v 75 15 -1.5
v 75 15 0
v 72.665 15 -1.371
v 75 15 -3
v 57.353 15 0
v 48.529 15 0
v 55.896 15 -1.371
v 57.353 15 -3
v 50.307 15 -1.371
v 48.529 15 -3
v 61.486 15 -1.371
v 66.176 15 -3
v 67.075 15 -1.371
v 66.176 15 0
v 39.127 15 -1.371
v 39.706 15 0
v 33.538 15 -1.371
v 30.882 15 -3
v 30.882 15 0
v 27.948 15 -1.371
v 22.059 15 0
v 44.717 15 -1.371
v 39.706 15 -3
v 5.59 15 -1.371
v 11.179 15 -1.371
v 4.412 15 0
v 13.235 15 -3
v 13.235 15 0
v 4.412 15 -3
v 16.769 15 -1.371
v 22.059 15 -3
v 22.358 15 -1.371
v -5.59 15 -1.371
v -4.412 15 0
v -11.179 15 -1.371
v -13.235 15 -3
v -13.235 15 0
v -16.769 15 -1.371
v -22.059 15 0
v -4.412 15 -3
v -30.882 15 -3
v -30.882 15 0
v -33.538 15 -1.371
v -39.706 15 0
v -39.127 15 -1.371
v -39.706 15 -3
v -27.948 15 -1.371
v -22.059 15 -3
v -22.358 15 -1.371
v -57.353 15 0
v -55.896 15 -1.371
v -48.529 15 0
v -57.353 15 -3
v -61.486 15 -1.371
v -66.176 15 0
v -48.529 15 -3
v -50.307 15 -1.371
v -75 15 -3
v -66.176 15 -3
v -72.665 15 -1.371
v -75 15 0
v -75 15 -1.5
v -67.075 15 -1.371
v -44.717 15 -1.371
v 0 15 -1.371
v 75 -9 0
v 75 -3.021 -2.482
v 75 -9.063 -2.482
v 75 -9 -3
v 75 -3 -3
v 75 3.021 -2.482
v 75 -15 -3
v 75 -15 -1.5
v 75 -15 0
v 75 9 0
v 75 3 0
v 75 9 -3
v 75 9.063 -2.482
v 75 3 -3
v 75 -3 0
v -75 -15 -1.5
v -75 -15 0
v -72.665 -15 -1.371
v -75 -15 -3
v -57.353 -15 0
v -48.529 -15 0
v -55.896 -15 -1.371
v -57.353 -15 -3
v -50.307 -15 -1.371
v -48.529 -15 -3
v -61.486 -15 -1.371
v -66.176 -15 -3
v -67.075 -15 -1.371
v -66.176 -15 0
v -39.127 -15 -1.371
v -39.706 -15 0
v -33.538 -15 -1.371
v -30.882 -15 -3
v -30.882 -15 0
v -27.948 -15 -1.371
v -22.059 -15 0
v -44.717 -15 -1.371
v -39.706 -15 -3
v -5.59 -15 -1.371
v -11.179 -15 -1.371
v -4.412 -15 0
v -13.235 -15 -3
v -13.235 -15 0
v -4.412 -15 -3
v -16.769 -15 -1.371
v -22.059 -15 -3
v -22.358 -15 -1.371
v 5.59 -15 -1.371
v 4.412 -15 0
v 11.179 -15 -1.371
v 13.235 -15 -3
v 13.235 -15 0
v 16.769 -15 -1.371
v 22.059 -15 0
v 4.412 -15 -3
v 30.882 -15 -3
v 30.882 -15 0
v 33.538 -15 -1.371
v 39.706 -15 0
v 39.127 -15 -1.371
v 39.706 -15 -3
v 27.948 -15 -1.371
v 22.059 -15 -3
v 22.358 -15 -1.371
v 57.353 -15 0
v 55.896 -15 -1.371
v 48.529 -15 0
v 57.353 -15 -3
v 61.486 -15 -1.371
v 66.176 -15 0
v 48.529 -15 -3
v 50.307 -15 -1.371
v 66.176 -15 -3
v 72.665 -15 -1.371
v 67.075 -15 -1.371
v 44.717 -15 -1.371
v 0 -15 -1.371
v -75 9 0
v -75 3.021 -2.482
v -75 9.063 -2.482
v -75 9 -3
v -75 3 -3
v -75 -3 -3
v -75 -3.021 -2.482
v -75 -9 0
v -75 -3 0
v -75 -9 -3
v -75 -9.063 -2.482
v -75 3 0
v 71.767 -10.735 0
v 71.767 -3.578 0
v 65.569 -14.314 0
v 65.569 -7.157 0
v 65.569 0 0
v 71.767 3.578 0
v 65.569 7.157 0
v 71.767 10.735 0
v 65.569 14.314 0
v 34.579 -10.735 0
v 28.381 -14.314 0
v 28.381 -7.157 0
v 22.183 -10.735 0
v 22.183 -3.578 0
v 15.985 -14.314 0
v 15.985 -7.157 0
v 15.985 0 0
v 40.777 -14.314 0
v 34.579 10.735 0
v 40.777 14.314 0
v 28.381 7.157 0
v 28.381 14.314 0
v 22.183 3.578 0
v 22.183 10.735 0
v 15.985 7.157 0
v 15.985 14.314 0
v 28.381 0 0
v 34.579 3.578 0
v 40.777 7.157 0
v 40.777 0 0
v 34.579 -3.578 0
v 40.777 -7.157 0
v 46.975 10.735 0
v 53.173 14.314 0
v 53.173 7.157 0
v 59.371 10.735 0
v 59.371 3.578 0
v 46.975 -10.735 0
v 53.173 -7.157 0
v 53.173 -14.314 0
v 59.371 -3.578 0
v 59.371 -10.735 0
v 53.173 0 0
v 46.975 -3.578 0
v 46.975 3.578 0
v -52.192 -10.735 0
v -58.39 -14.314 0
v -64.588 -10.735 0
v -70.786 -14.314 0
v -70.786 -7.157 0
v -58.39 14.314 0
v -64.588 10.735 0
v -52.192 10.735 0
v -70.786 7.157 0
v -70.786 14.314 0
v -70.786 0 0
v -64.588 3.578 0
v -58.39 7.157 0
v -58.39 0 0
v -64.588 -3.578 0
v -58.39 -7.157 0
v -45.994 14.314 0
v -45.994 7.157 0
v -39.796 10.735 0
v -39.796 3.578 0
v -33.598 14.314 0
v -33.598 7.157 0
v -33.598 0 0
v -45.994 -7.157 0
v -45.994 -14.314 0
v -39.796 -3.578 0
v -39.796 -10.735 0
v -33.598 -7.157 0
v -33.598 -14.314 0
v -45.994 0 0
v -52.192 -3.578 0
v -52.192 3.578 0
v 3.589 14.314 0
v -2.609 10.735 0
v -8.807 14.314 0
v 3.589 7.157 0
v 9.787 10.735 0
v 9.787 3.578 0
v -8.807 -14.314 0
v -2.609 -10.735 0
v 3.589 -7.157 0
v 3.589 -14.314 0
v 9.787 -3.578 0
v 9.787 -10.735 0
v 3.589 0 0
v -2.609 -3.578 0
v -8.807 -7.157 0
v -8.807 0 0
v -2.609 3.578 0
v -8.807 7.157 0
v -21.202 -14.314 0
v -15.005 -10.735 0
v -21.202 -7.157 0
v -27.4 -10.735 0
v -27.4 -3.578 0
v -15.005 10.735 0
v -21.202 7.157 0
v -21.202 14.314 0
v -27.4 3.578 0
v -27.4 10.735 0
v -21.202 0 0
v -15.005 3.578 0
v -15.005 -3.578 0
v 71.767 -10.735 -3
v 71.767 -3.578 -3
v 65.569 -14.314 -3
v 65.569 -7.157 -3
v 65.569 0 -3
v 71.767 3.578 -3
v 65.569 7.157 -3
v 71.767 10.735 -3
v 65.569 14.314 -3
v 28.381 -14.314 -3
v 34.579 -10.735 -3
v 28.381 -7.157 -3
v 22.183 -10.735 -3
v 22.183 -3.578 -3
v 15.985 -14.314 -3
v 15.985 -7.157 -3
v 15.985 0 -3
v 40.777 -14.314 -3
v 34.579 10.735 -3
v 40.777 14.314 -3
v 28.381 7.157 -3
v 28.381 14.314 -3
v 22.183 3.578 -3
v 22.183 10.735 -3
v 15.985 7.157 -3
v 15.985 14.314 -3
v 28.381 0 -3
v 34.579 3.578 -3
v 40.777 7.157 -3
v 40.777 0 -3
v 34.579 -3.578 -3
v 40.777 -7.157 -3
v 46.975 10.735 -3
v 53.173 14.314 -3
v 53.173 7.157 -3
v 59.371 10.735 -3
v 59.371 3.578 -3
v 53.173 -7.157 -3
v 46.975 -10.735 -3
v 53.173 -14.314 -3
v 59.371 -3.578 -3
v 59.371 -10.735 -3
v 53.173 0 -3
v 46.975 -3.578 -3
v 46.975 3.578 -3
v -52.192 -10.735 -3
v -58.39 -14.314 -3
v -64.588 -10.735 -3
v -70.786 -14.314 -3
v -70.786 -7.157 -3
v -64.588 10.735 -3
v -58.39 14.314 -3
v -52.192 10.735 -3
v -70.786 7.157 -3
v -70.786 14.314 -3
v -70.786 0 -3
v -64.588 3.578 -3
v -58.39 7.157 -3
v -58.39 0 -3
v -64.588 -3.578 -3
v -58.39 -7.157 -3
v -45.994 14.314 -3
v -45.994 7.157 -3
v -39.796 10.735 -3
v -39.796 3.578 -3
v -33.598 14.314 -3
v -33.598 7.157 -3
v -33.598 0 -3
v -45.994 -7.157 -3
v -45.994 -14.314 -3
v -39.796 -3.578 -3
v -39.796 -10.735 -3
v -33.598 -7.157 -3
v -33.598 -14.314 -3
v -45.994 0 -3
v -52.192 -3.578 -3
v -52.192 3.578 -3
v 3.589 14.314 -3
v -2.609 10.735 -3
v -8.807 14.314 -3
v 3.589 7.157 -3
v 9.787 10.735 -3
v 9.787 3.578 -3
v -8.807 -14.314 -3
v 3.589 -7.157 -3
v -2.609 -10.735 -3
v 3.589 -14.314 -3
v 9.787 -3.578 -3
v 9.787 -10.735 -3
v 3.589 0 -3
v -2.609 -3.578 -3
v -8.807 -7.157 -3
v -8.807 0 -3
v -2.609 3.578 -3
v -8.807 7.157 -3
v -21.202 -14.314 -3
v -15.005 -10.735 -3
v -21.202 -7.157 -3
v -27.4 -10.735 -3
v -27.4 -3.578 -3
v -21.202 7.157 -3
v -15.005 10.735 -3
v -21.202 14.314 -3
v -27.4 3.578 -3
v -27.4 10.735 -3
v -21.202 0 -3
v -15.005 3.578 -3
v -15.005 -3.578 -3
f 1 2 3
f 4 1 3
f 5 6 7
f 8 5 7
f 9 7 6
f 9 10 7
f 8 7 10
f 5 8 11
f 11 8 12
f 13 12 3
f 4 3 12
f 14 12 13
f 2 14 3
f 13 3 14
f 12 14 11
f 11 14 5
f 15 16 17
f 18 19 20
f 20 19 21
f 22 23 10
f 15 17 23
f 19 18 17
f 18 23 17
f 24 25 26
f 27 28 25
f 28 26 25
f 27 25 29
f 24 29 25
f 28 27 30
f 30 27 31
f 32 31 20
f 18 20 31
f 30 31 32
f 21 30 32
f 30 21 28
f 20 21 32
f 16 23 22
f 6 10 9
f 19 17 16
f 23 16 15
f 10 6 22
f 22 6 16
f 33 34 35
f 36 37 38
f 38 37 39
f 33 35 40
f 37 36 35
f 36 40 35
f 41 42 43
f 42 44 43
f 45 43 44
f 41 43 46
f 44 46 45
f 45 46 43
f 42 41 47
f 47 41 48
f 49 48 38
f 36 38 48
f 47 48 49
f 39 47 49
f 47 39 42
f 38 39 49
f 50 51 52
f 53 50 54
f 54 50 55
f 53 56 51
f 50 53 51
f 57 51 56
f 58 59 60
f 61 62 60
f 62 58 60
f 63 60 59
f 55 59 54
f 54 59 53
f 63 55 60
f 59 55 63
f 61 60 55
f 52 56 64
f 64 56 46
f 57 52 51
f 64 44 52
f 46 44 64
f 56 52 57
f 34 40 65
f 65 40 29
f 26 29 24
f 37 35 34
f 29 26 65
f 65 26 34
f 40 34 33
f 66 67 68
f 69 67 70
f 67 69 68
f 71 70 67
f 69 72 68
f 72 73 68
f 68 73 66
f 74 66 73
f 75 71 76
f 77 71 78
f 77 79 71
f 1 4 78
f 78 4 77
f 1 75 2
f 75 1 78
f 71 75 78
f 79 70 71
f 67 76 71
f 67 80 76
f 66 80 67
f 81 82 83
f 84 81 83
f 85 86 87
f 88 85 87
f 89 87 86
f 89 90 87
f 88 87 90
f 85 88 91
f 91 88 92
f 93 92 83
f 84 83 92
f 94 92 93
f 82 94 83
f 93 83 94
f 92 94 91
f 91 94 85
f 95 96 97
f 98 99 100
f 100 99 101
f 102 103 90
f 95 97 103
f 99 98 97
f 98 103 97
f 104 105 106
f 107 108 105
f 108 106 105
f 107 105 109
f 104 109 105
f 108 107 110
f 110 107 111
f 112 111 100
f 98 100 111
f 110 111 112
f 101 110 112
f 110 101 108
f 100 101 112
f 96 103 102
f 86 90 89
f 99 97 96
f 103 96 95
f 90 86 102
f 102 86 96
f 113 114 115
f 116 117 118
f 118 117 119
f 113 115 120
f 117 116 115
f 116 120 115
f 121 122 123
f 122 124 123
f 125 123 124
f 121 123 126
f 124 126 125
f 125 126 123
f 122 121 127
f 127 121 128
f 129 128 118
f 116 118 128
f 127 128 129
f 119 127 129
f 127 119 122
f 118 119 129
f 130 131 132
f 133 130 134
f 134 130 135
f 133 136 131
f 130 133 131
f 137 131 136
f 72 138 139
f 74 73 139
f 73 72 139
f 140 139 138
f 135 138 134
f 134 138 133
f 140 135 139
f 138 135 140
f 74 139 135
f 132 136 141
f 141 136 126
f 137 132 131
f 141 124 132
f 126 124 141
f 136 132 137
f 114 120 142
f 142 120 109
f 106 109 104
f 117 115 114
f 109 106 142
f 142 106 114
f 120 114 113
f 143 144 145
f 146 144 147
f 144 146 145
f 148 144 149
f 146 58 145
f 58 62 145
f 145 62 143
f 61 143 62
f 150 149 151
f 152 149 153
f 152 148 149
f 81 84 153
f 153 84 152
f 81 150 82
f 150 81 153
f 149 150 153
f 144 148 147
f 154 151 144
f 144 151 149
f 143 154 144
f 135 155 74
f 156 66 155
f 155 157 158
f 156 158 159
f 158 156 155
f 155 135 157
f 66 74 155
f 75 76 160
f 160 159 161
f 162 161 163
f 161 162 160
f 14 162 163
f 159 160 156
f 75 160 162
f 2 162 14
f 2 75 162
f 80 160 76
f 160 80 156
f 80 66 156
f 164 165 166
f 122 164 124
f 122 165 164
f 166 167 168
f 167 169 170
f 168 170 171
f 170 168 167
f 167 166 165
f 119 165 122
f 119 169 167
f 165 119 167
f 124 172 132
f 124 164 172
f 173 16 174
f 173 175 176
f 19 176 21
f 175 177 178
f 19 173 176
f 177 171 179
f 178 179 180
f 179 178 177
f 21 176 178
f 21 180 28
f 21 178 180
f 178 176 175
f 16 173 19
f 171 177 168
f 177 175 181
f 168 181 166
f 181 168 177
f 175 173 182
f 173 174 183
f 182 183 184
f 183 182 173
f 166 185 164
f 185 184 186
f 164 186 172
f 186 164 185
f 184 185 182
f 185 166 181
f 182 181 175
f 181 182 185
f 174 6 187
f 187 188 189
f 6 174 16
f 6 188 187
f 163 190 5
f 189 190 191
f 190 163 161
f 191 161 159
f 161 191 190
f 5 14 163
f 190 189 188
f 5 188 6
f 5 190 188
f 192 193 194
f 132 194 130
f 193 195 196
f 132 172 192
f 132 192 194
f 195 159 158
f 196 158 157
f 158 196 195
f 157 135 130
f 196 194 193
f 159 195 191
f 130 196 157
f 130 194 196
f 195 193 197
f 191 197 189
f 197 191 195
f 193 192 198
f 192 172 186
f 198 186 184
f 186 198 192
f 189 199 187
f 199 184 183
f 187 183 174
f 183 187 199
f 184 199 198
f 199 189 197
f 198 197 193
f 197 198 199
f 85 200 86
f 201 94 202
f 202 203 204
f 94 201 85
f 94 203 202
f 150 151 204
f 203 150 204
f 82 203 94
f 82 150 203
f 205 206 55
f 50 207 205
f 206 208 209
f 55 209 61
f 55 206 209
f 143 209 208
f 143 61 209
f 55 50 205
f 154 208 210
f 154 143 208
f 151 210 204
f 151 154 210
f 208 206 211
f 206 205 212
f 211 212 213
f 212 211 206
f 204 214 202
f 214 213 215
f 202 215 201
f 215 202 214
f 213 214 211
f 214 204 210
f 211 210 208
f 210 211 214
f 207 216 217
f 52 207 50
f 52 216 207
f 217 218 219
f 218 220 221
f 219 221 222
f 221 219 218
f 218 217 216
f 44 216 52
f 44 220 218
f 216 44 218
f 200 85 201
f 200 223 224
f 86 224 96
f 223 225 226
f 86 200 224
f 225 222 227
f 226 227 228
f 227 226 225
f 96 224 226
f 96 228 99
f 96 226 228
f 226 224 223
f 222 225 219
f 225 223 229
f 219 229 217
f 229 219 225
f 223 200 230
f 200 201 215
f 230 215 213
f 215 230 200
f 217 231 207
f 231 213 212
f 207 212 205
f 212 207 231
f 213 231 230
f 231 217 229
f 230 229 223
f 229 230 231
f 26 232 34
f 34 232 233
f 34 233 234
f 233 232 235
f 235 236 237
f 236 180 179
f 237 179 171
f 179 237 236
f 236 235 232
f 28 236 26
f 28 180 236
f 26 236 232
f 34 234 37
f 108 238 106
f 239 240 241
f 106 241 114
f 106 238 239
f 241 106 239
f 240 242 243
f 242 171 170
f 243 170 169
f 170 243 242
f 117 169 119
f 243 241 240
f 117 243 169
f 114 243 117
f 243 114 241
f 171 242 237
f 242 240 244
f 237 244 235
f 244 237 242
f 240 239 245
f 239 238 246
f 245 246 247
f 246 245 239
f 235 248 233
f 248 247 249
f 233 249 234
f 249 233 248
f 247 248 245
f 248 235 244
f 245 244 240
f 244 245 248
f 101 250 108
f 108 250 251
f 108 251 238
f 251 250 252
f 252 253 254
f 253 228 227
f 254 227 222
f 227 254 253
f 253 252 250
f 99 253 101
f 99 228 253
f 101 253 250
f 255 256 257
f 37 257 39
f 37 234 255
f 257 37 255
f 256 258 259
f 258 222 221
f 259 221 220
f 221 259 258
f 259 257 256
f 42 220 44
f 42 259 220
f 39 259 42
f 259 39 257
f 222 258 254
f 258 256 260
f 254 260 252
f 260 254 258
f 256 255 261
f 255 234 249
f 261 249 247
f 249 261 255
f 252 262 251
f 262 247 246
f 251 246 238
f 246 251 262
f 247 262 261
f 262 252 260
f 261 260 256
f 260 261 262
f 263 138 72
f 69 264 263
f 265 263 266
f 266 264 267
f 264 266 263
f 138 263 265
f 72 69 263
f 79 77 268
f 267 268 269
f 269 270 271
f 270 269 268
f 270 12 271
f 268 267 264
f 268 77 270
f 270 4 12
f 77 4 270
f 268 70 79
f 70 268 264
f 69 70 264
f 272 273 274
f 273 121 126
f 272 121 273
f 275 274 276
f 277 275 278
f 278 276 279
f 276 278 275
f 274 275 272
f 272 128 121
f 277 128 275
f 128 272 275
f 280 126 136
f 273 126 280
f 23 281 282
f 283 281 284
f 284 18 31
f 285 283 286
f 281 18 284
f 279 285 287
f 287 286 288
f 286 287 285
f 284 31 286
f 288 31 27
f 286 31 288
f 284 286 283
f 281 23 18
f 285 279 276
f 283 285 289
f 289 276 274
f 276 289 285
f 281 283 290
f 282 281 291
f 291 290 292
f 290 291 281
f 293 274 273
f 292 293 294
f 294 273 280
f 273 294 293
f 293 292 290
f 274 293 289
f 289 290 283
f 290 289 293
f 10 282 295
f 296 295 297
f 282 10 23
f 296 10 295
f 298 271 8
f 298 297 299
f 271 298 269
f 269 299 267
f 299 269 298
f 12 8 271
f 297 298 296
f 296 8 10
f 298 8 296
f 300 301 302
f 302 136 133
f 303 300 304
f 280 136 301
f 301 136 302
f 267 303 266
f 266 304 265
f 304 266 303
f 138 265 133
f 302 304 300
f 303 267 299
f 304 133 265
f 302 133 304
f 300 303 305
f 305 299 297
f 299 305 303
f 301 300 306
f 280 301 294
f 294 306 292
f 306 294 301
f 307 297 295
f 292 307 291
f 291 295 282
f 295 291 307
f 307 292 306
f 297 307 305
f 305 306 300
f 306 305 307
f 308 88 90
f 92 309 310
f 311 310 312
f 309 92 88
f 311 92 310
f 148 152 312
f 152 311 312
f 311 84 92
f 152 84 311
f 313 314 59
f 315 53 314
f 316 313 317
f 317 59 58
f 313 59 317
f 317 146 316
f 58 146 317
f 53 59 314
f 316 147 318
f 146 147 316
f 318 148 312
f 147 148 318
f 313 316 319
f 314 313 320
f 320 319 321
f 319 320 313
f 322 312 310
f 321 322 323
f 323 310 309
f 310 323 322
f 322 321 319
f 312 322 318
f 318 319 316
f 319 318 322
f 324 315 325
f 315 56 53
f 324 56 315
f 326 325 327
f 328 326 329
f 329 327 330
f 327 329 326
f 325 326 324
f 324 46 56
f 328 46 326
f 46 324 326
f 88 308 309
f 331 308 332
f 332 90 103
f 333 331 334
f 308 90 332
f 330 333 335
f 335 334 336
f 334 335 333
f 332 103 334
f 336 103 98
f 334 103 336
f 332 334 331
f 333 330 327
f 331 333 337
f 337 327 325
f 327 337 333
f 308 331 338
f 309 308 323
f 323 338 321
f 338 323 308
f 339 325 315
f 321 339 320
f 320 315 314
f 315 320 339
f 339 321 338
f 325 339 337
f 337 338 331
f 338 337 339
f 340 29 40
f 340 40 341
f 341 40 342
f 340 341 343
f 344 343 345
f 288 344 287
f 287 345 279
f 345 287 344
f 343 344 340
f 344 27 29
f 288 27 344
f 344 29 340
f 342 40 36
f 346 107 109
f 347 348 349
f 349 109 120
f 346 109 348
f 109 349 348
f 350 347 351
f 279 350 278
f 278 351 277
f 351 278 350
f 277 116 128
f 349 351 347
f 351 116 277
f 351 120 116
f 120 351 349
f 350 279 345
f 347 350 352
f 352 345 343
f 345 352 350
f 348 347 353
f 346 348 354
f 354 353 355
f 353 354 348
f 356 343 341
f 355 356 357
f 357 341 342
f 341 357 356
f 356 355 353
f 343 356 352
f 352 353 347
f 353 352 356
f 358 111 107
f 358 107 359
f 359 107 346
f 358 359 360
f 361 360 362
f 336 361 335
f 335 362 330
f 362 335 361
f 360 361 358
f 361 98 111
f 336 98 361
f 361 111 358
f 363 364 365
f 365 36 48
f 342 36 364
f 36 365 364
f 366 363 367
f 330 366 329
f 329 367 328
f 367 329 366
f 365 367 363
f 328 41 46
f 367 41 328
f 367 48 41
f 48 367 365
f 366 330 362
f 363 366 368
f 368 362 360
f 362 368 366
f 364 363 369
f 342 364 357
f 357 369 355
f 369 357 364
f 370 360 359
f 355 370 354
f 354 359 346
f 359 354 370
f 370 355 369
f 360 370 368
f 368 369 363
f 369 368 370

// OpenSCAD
// CSG file generated from FreeCAD 1.0.0
group() {
 group(){
multmatrix([[1.0, 0.0, 0.0,            0.0], [0.0, -2.220446049250313e-16, -1.0000000000000002, 0.0], [0.0, 1.0000000000000002, -2.220446049250313e-16, 0.0], [             0, 0, 0, 1]]){
polyhedron ( points = [[-75.000000,-0.000000,-15.000000],[-75.000000,-3.000000,-15.000000],[75.000000,-0.000000,-15.000000],[75.000000,-3.000000,-15.000000],[75.000000,0.000000,15.000000],[75.000000,-3.000000,15.000000],[-75.000000,0.000000,15.000000],[-75.000000,-3.000000,15.000000],[-75.000000,-1.500000,-15.000000],[75.000000,-1.500000,-15.000000],[-66.176468,-0.000000,-15.000000],[-57.352940,-0.000000,-15.000000],[-48.529411,-0.000000,-15.000000],[-39.705883,-0.000000,-15.000000],[-30.882353,-0.000000,-15.000000],[-22.058823,-0.000000,-15.000000],[-13.235294,-0.000000,-15.000000],[-4.411765,-0.000000,-15.000000],[4.411765,-0.000000,-15.000000],[13.235294,-0.000000,-15.000000],[22.058823,-0.000000,-15.000000],[30.882353,-0.000000,-15.000000],[39.705883,-0.000000,-15.000000],[48.529411,-0.000000,-15.000000],[57.352940,-0.000000,-15.000000],[66.176468,-0.000000,-15.000000],[-66.176468,-3.000000,-15.000000],[-57.352940,-3.000000,-15.000000],[-48.529411,-3.000000,-15.000000],[-39.705883,-3.000000,-15.000000],[-30.882353,-3.000000,-15.000000],[-22.058823,-3.000000,-15.000000],[-13.235294,-3.000000,-15.000000],[-4.411765,-3.000000,-15.000000],[4.411765,-3.000000,-15.000000],[13.235294,-3.000000,-15.000000],[22.058823,-3.000000,-15.000000],[30.882353,-3.000000,-15.000000],[39.705883,-3.000000,-15.000000],[48.529411,-3.000000,-15.000000],[57.352940,-3.000000,-15.000000],[66.176468,-3.000000,-15.000000],[75.000000,-1.500000,15.000000],[75.000000,-0.000000,-9.000000],[75.000000,-0.000000,-3.000000],[75.000000,0.000000,3.000000],[75.000000,0.000000,9.000000],[75.000000,-3.000000,-9.000000],[75.000000,-3.000000,-3.000000],[75.000000,-3.000000,3.000000],[75.000000,-3.000000,9.000000],[-75.000000,-1.500000,15.000000],[66.176468,0.000000,15.000000],[57.352940,0.000000,15.000000],[48.529411,0.000000,15.000000],[39.705883,0.000000,15.000000],[30.882353,0.000000,15.000000],[22.058823,0.000000,15.000000],[13.235294,0.000000,15.000000],[4.411765,0.000000,15.000000],[-4.411765,0.000000,15.000000],[-13.235294,0.000000,15.000000],[-22.058823,0.000000,15.000000],[-30.882353,0.000000,15.000000],[-39.705883,0.000000,15.000000],[-48.529411,0.000000,15.000000],[-57.352940,0.000000,15.000000],[-66.176468,0.000000,15.000000],[66.176468,-3.000000,15.000000],[57.352940,-3.000000,15.000000],[48.529411,-3.000000,15.000000],[39.705883,-3.000000,15.000000],[30.882353,-3.000000,15.000000],[22.058823,-3.000000,15.000000],[13.235294,-3.000000,15.000000],[4.411765,-3.000000,15.000000],[-4.411765,-3.000000,15.000000],[-13.235294,-3.000000,15.000000],[-22.058823,-3.000000,15.000000],[-30.882353,-3.000000,15.000000],[-39.705883,-3.000000,15.000000],[-48.529411,-3.000000,15.000000],[-57.352940,-3.000000,15.000000],[-66.176468,-3.000000,15.000000],[-75.000000,0.000000,9.000000],[-75.000000,0.000000,3.000000],[-75.000000,-0.000000,-3.000000],[-75.000000,-0.000000,-9.000000],[-75.000000,-3.000000,9.000000],[-75.000000,-3.000000,3.000000],[-75.000000,-3.000000,-3.000000],[-75.000000,-3.000000,-9.000000],[72.665016,-1.371131,-15.000000],[61.485783,-1.371131,-15.000000],[50.306549,-1.371131,-15.000000],[39.127316,-1.371131,-15.000000],[27.948084,-1.371131,-15.000000],[16.768850,-1.371131,-15.000000],[5.589617,-1.371131,-15.000000],[-5.589617,-1.371131,-15.000000],[-16.768850,-1.371131,-15.000000],[-27.948084,-1.371131,-15.000000],[-39.127319,-1.371131,-15.000000],[-50.306553,-1.371131,-15.000000],[-61.485786,-1.371131,-15.000000],[-72.665016,-1.371131,-15.000000],[55.896168,-1.371131,-15.000000],[67.075401,-1.371131,-15.000000],[33.537701,-1.371131,-15.000000],[11.179234,-1.371131,-15.000000],[22.358467,-1.371131,-15.000000],[44.716934,-1.371131,-15.000000],[-11.179234,-1.371131,-15.000000],[-33.537701,-1.371131,-15.000000],[-22.358467,-1.371131,-15.000000],[-55.896168,-1.371131,-15.000000],[-67.075401,-1.371131,-15.000000],[-44.716934,-1.371131,-15.000000],[-0.000000,-1.371131,-15.000000],[75.000000,-2.481732,9.063049],[75.000000,-2.481732,3.021016],[75.000000,-2.481732,-3.021016],[75.000000,-2.481732,-9.063049],[-72.665016,-1.371131,15.000000],[-61.485783,-1.371131,15.000000],[-50.306549,-1.371131,15.000000],[-39.127316,-1.371131,15.000000],[-27.948084,-1.371131,15.000000],[-16.768850,-1.371131,15.000000],[-5.589617,-1.371131,15.000000],[5.589617,-1.371131,15.000000],[16.768850,-1.371131,15.000000],[27.948084,-1.371131,15.000000],[39.127319,-1.371131,15.000000],[50.306553,-1.371131,15.000000],[61.485786,-1.371131,15.000000],[72.665016,-1.371131,15.000000],[-55.896168,-1.371131,15.000000],[-67.075401,-1.371131,15.000000],[-33.537701,-1.371131,15.000000],[-11.179234,-1.371131,15.000000],[-22.358467,-1.371131,15.000000],[-44.716934,-1.371131,15.000000],[11.179234,-1.371131,15.000000],[33.537701,-1.371131,15.000000],[22.358467,-1.371131,15.000000],[55.896168,-1.371131,15.000000],[67.075401,-1.371131,15.000000],[44.716934,-1.371131,15.000000],[0.000000,-1.371131,15.000000],[-75.000000,-2.481732,-9.063049],[-75.000000,-2.481732,-3.021016],[-75.000000,-2.481732,3.021016],[-75.000000,-2.481732,9.063049],[15.985134,0.000000,0.000000],[-58.390079,-0.000000,-14.313517],[-58.390079,0.000000,14.313517],[-33.598343,0.000000,0.000000],[-8.806604,0.000000,14.313517],[-8.806604,-0.000000,-14.313517],[65.568611,0.000000,0.000000],[40.776871,0.000000,14.313517],[40.776871,-0.000000,-14.313517],[65.568611,0.000000,14.313517],[65.568611,-0.000000,-14.313517],[28.381002,0.000000,7.156758],[15.985134,0.000000,14.313517],[28.381002,-0.000000,-7.156758],[15.985134,-0.000000,-14.313517],[40.776871,0.000000,0.000000],[53.172741,-0.000000,-7.156758],[53.172741,0.000000,7.156758],[-70.785950,0.000000,7.156758],[-70.785950,-0.000000,-7.156758],[-58.390079,0.000000,0.000000],[-45.994209,-0.000000,-7.156758],[-33.598343,-0.000000,-14.313517],[-45.994209,0.000000,7.156758],[-33.598343,0.000000,14.313517],[3.589265,-0.000000,-7.156758],[3.589265,0.000000,7.156758],[-8.806604,0.000000,0.000000],[-21.202473,0.000000,7.156758],[-21.202473,-0.000000,-7.156758],[71.766548,0.000000,10.735138],[71.766548,0.000000,3.578379],[65.568611,0.000000,7.156758],[71.766548,-0.000000,-3.578379],[71.766548,-0.000000,-10.735138],[65.568611,-0.000000,-7.156758],[34.578938,0.000000,10.735138],[28.381002,0.000000,14.313517],[22.183069,0.000000,10.735138],[22.183069,0.000000,3.578379],[15.985134,0.000000,7.156758],[34.578938,-0.000000,-10.735138],[28.381002,-0.000000,-14.313517],[22.183069,-0.000000,-3.578379],[22.183069,-0.000000,-10.735138],[15.985134,-0.000000,-7.156758],[28.381002,0.000000,0.000000],[34.578938,-0.000000,-3.578379],[40.776871,-0.000000,-7.156758],[34.578938,0.000000,3.578379],[40.776871,0.000000,7.156758],[46.974808,-0.000000,-10.735138],[53.172741,-0.000000,-14.313517],[59.370674,-0.000000,-10.735138],[59.370674,-0.000000,-3.578379],[46.974808,0.000000,10.735138],[53.172741,0.000000,14.313517],[59.370674,0.000000,3.578379],[59.370674,0.000000,10.735138],[53.172741,0.000000,0.000000],[46.974808,0.000000,3.578379],[46.974808,-0.000000,-3.578379],[-64.588013,0.000000,10.735138],[-70.785950,0.000000,14.313517],[-64.588013,-0.000000,-10.735138],[-70.785950,-0.000000,-14.313517],[-70.785950,0.000000,0.000000],[-64.588013,-0.000000,-3.578379],[-58.390079,-0.000000,-7.156758],[-64.588013,0.000000,3.578379],[-58.390079,0.000000,7.156758],[-52.192146,-0.000000,-10.735138],[-45.994209,-0.000000,-14.313517],[-39.796276,-0.000000,-10.735138],[-39.796276,-0.000000,-3.578379],[-33.598343,-0.000000,-7.156758],[-52.192146,0.000000,10.735138],[-45.994209,0.000000,14.313517],[-39.796276,0.000000,3.578379],[-39.796276,0.000000,10.735138],[-33.598343,0.000000,7.156758],[-45.994209,0.000000,0.000000],[-52.192146,0.000000,3.578379],[-52.192146,-0.000000,-3.578379],[-2.608670,-0.000000,-10.735138],[3.589265,-0.000000,-14.313517],[9.787199,-0.000000,-10.735138],[9.787199,-0.000000,-3.578379],[-2.608670,0.000000,10.735138],[3.589265,0.000000,14.313517],[9.787199,0.000000,3.578379],[9.787199,0.000000,10.735138],[3.589265,0.000000,0.000000],[-2.608670,0.000000,3.578379],[-8.806604,0.000000,7.156758],[-2.608670,-0.000000,-3.578379],[-8.806604,-0.000000,-7.156758],[-15.004539,0.000000,10.735138],[-21.202473,0.000000,14.313517],[-27.400408,0.000000,10.735138],[-27.400408,0.000000,3.578379],[-15.004539,-0.000000,-10.735138],[-21.202473,-0.000000,-14.313517],[-27.400408,-0.000000,-3.578379],[-27.400408,-0.000000,-10.735138],[-21.202473,0.000000,0.000000],[-15.004539,-0.000000,-3.578379],[-15.004539,0.000000,3.578379],[15.985134,-3.000000,0.000000],[-58.390079,-3.000000,-14.313517],[-58.390079,-3.000000,14.313517],[-33.598343,-3.000000,0.000000],[-8.806604,-3.000000,14.313517],[-8.806604,-3.000000,-14.313517],[65.568611,-3.000000,0.000000],[40.776871,-3.000000,14.313517],[40.776871,-3.000000,-14.313517],[65.568611,-3.000000,14.313517],[65.568611,-3.000000,-14.313517],[28.381002,-3.000000,7.156758],[15.985134,-3.000000,14.313517],[28.381002,-3.000000,-7.156758],[15.985134,-3.000000,-14.313517],[40.776871,-3.000000,0.000000],[53.172741,-3.000000,-7.156758],[53.172741,-3.000000,7.156758],[-70.785950,-3.000000,7.156758],[-70.785950,-3.000000,-7.156758],[-58.390079,-3.000000,0.000000],[-45.994209,-3.000000,-7.156758],[-33.598343,-3.000000,-14.313517],[-45.994209,-3.000000,7.156758],[-33.598343,-3.000000,14.313517],[3.589265,-3.000000,-7.156758],[3.589265,-3.000000,7.156758],[-8.806604,-3.000000,0.000000],[-21.202473,-3.000000,7.156758],[-21.202473,-3.000000,-7.156758],[71.766548,-3.000000,10.735138],[71.766548,-3.000000,3.578379],[65.568611,-3.000000,7.156758],[71.766548,-3.000000,-3.578379],[71.766548,-3.000000,-10.735138],[65.568611,-3.000000,-7.156758],[34.578938,-3.000000,10.735138],[28.381002,-3.000000,14.313517],[22.183069,-3.000000,10.735138],[22.183069,-3.000000,3.578379],[15.985134,-3.000000,7.156758],[34.578938,-3.000000,-10.735138],[28.381002,-3.000000,-14.313517],[22.183069,-3.000000,-3.578379],[22.183069,-3.000000,-10.735138],[15.985134,-3.000000,-7.156758],[28.381002,-3.000000,0.000000],[34.578938,-3.000000,-3.578379],[40.776871,-3.000000,-7.156758],[34.578938,-3.000000,3.578379],[40.776871,-3.000000,7.156758],[46.974808,-3.000000,-10.735138],[53.172741,-3.000000,-14.313517],[59.370674,-3.000000,-10.735138],[59.370674,-3.000000,-3.578379],[46.974808,-3.000000,10.735138],[53.172741,-3.000000,14.313517],[59.370674,-3.000000,3.578379],[59.370674,-3.000000,10.735138],[53.172741,-3.000000,0.000000],[46.974808,-3.000000,3.578379],[46.974808,-3.000000,-3.578379],[-64.588013,-3.000000,10.735138],[-70.785950,-3.000000,14.313517],[-64.588013,-3.000000,-10.735138],[-70.785950,-3.000000,-14.313517],[-70.785950,-3.000000,0.000000],[-64.588013,-3.000000,-3.578379],[-58.390079,-3.000000,-7.156758],[-64.588013,-3.000000,3.578379],[-58.390079,-3.000000,7.156758],[-52.192146,-3.000000,-10.735138],[-45.994209,-3.000000,-14.313517],[-39.796276,-3.000000,-10.735138],[-39.796276,-3.000000,-3.578379],[-33.598343,-3.000000,-7.156758],[-52.192146,-3.000000,10.735138],[-45.994209,-3.000000,14.313517],[-39.796276,-3.000000,3.578379],[-39.796276,-3.000000,10.735138],[-33.598343,-3.000000,7.156758],[-45.994209,-3.000000,0.000000],[-52.192146,-3.000000,3.578379],[-52.192146,-3.000000,-3.578379],[-2.608670,-3.000000,-10.735138],[3.589265,-3.000000,-14.313517],[9.787199,-3.000000,-10.735138],[9.787199,-3.000000,-3.578379],[-2.608670,-3.000000,10.735138],[3.589265,-3.000000,14.313517],[9.787199,-3.000000,3.578379],[9.787199,-3.000000,10.735138],[3.589265,-3.000000,0.000000],[-2.608670,-3.000000,3.578379],[-8.806604,-3.000000,7.156758],[-2.608670,-3.000000,-3.578379],[-8.806604,-3.000000,-7.156758],[-15.004539,-3.000000,10.735138],[-21.202473,-3.000000,14.313517],[-27.400408,-3.000000,10.735138],[-27.400408,-3.000000,3.578379],[-15.004539,-3.000000,-10.735138],[-21.202473,-3.000000,-14.313517],[-27.400408,-3.000000,-3.578379],[-27.400408,-3.000000,-10.735138],[-21.202473,-3.000000,0.000000],[-15.004539,-3.000000,-3.578379],[-15.004539,-3.000000,3.578379]], faces = [[92,2,9],[92,9,3],[106,23,24],[106,24,40],[23,106,94],[106,39,94],[39,106,40],[93,40,24],[41,40,93],[92,41,107],[41,92,3],[107,41,25],[92,25,2],[25,92,107],[93,25,41],[24,25,93],[108,22,95],[96,21,37],[20,21,96],[39,38,111],[38,108,95],[108,37,21],[108,38,37],[18,109,98],[109,19,35],[109,18,19],[34,109,35],[109,34,98],[97,35,19],[36,35,97],[96,36,110],[36,96,37],[110,36,97],[110,97,20],[19,20,97],[110,20,96],[111,38,22],[94,39,23],[22,108,21],[95,22,38],[111,23,39],[22,23,111],[112,17,99],[100,16,32],[15,16,100],[33,112,99],[112,32,16],[112,33,32],[113,14,30],[113,13,14],[13,113,102],[29,113,30],[102,29,13],[113,29,102],[101,30,14],[31,30,101],[100,31,114],[31,100,32],[114,31,101],[114,101,15],[14,15,101],[114,15,100],[12,115,11],[104,11,27],[10,11,104],[115,28,27],[115,27,11],[28,115,103],[105,26,1],[105,8,0],[105,1,8],[26,105,116],[104,26,10],[27,26,104],[105,10,116],[116,10,26],[10,105,0],[117,28,12],[29,28,117],[115,12,103],[12,13,117],[117,13,29],[103,12,28],[118,33,17],[34,33,118],[98,34,18],[17,112,16],[118,18,34],[17,18,118],[99,17,33],[119,120,46],[49,120,50],[119,50,120],[120,49,121],[119,5,50],[119,42,5],[46,42,119],[42,46,4],[44,121,43],[122,121,47],[121,48,47],[122,3,9],[47,3,122],[2,43,9],[122,9,43],[122,43,121],[121,49,48],[121,44,120],[44,45,120],[120,45,46],[123,6,51],[123,51,7],[137,65,66],[137,66,82],[65,137,125],[137,81,125],[81,137,82],[124,82,66],[83,82,124],[123,83,138],[83,123,7],[138,83,67],[123,67,6],[67,123,138],[124,67,83],[66,67,124],[139,64,126],[127,63,79],[62,63,127],[81,80,142],[80,139,126],[139,79,63],[139,80,79],[60,140,129],[140,61,77],[140,60,61],[76,140,77],[140,76,129],[128,77,61],[78,77,128],[127,78,141],[78,127,79],[141,78,128],[141,128,62],[61,62,128],[141,62,127],[142,80,64],[125,81,65],[64,139,63],[126,64,80],[142,65,81],[64,65,142],[143,59,130],[131,58,74],[57,58,131],[75,143,130],[143,74,58],[143,75,74],[144,56,72],[144,55,56],[55,144,133],[71,144,72],[133,71,55],[144,71,133],[132,72,56],[73,72,132],[131,73,145],[73,131,74],[145,73,132],[145,132,57],[56,57,132],[145,57,131],[54,146,53],[135,53,69],[52,53,135],[146,70,69],[146,69,53],[70,146,134],[136,68,5],[136,42,4],[136,5,42],[68,136,147],[135,68,52],[69,68,135],[136,52,147],[147,52,68],[52,136,4],[148,70,54],[71,70,148],[146,54,134],[54,55,148],[148,55,71],[134,54,70],[149,75,59],[76,75,149],[129,76,60],[59,143,58],[149,60,76],[59,60,149],[130,59,75],[150,151,87],[90,151,91],[150,91,151],[152,151,89],[150,1,91],[150,8,1],[87,8,150],[8,87,0],[85,152,84],[153,152,88],[152,89,88],[153,7,51],[88,7,153],[6,84,51],[153,51,84],[153,84,152],[90,89,151],[151,85,86],[152,85,151],[151,86,87],[4,184,52],[184,46,185],[186,163,184],[160,186,185],[184,185,186],[163,52,184],[184,4,46],[187,44,43],[189,160,187],[164,189,188],[187,188,189],[164,188,25],[185,187,160],[188,187,43],[25,188,2],[188,43,2],[44,187,45],[185,45,187],[185,46,45],[165,191,190],[55,190,56],[190,191,56],[193,192,165],[194,166,192],[154,194,193],[192,193,194],[191,165,192],[56,191,57],[192,166,57],[192,57,191],[54,161,55],[161,190,55],[162,22,195],[196,167,195],[20,196,21],[198,197,167],[196,195,21],[199,154,197],[168,199,198],[197,198,199],[198,196,20],[19,168,20],[168,198,20],[167,196,198],[21,195,22],[193,197,154],[200,167,197],[165,200,193],[197,193,200],[201,195,167],[202,162,195],[169,202,201],[195,201,202],[190,203,165],[204,169,203],[161,204,190],[203,190,204],[201,203,169],[200,165,203],[167,200,201],[203,201,200],[205,23,162],[170,206,205],[22,162,23],[205,206,23],[24,207,164],[208,207,170],[189,164,207],[160,189,208],[207,208,189],[164,25,24],[206,170,207],[23,206,24],[206,207,24],[210,171,209],[53,210,54],[212,211,171],[209,161,54],[210,209,54],[186,160,211],[163,186,212],[211,212,186],[53,52,163],[171,210,212],[208,211,160],[163,212,53],[212,210,53],[213,171,211],[170,213,208],[211,208,213],[214,209,171],[204,161,209],[169,204,214],[209,214,204],[205,215,170],[202,169,215],[162,202,205],[215,205,202],[214,215,169],[213,170,215],[171,213,214],[215,214,213],[65,230,66],[216,67,156],[172,217,216],[66,156,67],[216,217,67],[172,85,84],[172,84,217],[67,217,6],[217,84,6],[10,218,155],[155,225,11],[219,173,218],[0,219,10],[219,218,10],[173,219,87],[219,0,87],[155,11,10],[220,173,86],[173,87,86],[172,220,85],[220,86,85],[221,218,173],[222,155,218],[174,222,221],[218,221,222],[216,223,172],[224,174,223],[156,224,216],[223,216,224],[221,223,174],[220,172,223],[173,220,221],[223,221,220],[175,226,225],[11,225,12],[225,226,12],[228,227,175],[229,176,227],[157,229,228],[227,228,229],[226,175,227],[12,226,13],[227,176,13],[227,13,226],[156,66,230],[231,177,230],[64,231,65],[233,232,177],[231,230,65],[234,157,232],[178,234,233],[232,233,234],[233,231,64],[63,178,64],[178,233,64],[177,231,233],[228,232,157],[235,177,232],[175,235,228],[232,228,235],[236,230,177],[224,156,230],[174,224,236],[230,236,224],[225,237,175],[222,174,237],[155,222,225],[237,225,222],[236,237,174],[235,175,237],[177,235,236],[237,236,235],[17,239,18],[238,239,17],[159,238,17],[179,239,238],[241,240,179],[199,168,240],[154,199,241],[240,241,199],[239,179,240],[18,240,19],[240,168,19],[239,240,18],[16,159,17],[60,158,61],[243,180,242],[59,243,60],[242,158,60],[242,60,243],[245,244,180],[194,154,244],[166,194,245],[244,245,194],[57,166,58],[180,243,245],[166,245,58],[58,245,59],[243,59,245],[241,244,154],[246,180,244],[179,246,241],[244,241,246],[247,242,180],[248,158,242],[181,248,247],[242,247,248],[238,249,179],[250,181,249],[159,250,238],[249,238,250],[247,249,181],[246,179,249],[180,246,247],[249,247,246],[61,252,62],[251,252,61],[158,251,61],[182,252,251],[254,253,182],[234,178,253],[157,234,254],[253,254,234],[252,182,253],[62,253,63],[253,178,63],[252,253,62],[256,183,255],[15,256,16],[255,159,16],[255,16,256],[258,257,183],[229,157,257],[176,229,258],[257,258,229],[183,256,258],[13,176,14],[176,258,14],[14,258,15],[256,15,258],[254,257,157],[259,183,257],[182,259,254],[257,254,259],[260,255,183],[250,159,255],[181,250,260],[255,260,250],[251,261,182],[248,181,261],[158,248,251],[261,251,248],[260,261,181],[259,182,261],[183,259,260],[261,260,259],[5,68,292],[292,293,50],[294,292,271],[268,293,294],[292,294,293],[271,292,68],[292,50,5],[295,47,48],[297,295,268],[272,296,297],[295,297,296],[272,41,296],[293,268,295],[296,47,295],[41,3,296],[296,3,47],[48,49,295],[293,295,49],[293,49,50],[273,298,299],[71,72,298],[298,72,299],[301,273,300],[302,300,274],[262,301,302],[300,302,301],[299,300,273],[72,73,299],[300,73,274],[300,299,73],[70,71,269],[269,71,298],[270,303,38],[304,303,275],[36,37,304],[306,275,305],[304,37,303],[307,305,262],[276,306,307],[305,307,306],[306,36,304],[35,36,276],[276,36,306],[275,306,304],[37,38,303],[301,262,305],[308,305,275],[273,301,308],[305,308,301],[309,275,303],[310,303,270],[277,309,310],[303,310,309],[298,273,311],[312,311,277],[269,298,312],[311,312,298],[309,277,311],[308,311,273],[275,309,308],[311,308,309],[313,270,39],[278,313,314],[38,39,270],[313,39,314],[40,272,315],[316,278,315],[297,315,272],[268,316,297],[315,297,316],[272,40,41],[314,315,278],[39,40,314],[314,40,315],[318,317,279],[69,70,318],[320,279,319],[317,70,269],[318,70,317],[294,319,268],[271,320,294],[319,294,320],[69,271,68],[279,320,318],[316,268,319],[271,69,320],[320,69,318],[321,319,279],[278,316,321],[319,321,316],[322,279,317],[312,317,269],[277,322,312],[317,312,322],[313,278,323],[310,323,277],[270,313,310],[323,310,313],[322,277,323],[321,323,278],[279,322,321],[323,321,322],[81,82,338],[324,264,83],[280,324,325],[82,83,264],[324,83,325],[280,88,89],[280,325,88],[83,7,325],[325,7,88],[26,263,326],[263,27,333],[327,326,281],[1,26,327],[327,26,326],[281,91,327],[327,91,1],[263,26,27],[328,90,281],[281,90,91],[280,89,328],[328,89,90],[329,281,326],[330,326,263],[282,329,330],[326,330,329],[324,280,331],[332,331,282],[264,324,332],[331,332,324],[329,282,331],[328,331,280],[281,329,328],[331,328,329],[283,333,334],[27,28,333],[333,28,334],[336,283,335],[337,335,284],[265,336,337],[335,337,336],[334,335,283],[28,29,334],[335,29,284],[335,334,29],[264,338,82],[339,338,285],[80,81,339],[341,285,340],[339,81,338],[342,340,265],[286,341,342],[340,342,341],[341,80,339],[79,80,286],[286,80,341],[285,341,339],[336,265,340],[343,340,285],[283,336,343],[340,343,336],[344,285,338],[332,338,264],[282,344,332],[338,332,344],[333,283,345],[330,345,282],[263,333,330],[345,330,333],[344,282,345],[343,345,283],[285,344,343],[345,343,344],[33,34,347],[346,33,347],[267,33,346],[287,346,347],[349,287,348],[307,348,276],[262,349,307],[348,307,349],[347,348,287],[34,35,348],[348,35,276],[347,34,348],[32,33,267],[76,77,266],[351,350,288],[75,76,351],[350,76,266],[350,351,76],[353,288,352],[302,352,262],[274,353,302],[352,302,353],[73,74,274],[288,353,351],[274,74,353],[74,75,353],[351,353,75],[349,262,352],[354,352,288],[287,349,354],[352,354,349],[355,288,350],[356,350,266],[289,355,356],[350,356,355],[346,287,357],[358,357,289],[267,346,358],[357,358,346],[355,289,357],[354,357,287],[288,355,354],[357,354,355],[77,78,360],[359,77,360],[266,77,359],[290,359,360],[362,290,361],[342,361,286],[265,362,342],[361,342,362],[360,361,290],[78,79,361],[361,79,286],[360,78,361],[364,363,291],[31,32,364],[363,32,267],[363,364,32],[366,291,365],[337,365,265],[284,366,337],[365,337,366],[291,366,364],[29,30,284],[284,30,366],[30,31,366],[364,366,31],[362,265,365],[367,365,291],[290,362,367],[365,367,362],[368,291,363],[358,363,267],[289,368,358],[363,358,368],[359,290,369],[356,369,289],[266,359,356],[369,356,359],[368,289,369],[367,369,290],[291,368,367],[369,367,368]]);
}
}
}
